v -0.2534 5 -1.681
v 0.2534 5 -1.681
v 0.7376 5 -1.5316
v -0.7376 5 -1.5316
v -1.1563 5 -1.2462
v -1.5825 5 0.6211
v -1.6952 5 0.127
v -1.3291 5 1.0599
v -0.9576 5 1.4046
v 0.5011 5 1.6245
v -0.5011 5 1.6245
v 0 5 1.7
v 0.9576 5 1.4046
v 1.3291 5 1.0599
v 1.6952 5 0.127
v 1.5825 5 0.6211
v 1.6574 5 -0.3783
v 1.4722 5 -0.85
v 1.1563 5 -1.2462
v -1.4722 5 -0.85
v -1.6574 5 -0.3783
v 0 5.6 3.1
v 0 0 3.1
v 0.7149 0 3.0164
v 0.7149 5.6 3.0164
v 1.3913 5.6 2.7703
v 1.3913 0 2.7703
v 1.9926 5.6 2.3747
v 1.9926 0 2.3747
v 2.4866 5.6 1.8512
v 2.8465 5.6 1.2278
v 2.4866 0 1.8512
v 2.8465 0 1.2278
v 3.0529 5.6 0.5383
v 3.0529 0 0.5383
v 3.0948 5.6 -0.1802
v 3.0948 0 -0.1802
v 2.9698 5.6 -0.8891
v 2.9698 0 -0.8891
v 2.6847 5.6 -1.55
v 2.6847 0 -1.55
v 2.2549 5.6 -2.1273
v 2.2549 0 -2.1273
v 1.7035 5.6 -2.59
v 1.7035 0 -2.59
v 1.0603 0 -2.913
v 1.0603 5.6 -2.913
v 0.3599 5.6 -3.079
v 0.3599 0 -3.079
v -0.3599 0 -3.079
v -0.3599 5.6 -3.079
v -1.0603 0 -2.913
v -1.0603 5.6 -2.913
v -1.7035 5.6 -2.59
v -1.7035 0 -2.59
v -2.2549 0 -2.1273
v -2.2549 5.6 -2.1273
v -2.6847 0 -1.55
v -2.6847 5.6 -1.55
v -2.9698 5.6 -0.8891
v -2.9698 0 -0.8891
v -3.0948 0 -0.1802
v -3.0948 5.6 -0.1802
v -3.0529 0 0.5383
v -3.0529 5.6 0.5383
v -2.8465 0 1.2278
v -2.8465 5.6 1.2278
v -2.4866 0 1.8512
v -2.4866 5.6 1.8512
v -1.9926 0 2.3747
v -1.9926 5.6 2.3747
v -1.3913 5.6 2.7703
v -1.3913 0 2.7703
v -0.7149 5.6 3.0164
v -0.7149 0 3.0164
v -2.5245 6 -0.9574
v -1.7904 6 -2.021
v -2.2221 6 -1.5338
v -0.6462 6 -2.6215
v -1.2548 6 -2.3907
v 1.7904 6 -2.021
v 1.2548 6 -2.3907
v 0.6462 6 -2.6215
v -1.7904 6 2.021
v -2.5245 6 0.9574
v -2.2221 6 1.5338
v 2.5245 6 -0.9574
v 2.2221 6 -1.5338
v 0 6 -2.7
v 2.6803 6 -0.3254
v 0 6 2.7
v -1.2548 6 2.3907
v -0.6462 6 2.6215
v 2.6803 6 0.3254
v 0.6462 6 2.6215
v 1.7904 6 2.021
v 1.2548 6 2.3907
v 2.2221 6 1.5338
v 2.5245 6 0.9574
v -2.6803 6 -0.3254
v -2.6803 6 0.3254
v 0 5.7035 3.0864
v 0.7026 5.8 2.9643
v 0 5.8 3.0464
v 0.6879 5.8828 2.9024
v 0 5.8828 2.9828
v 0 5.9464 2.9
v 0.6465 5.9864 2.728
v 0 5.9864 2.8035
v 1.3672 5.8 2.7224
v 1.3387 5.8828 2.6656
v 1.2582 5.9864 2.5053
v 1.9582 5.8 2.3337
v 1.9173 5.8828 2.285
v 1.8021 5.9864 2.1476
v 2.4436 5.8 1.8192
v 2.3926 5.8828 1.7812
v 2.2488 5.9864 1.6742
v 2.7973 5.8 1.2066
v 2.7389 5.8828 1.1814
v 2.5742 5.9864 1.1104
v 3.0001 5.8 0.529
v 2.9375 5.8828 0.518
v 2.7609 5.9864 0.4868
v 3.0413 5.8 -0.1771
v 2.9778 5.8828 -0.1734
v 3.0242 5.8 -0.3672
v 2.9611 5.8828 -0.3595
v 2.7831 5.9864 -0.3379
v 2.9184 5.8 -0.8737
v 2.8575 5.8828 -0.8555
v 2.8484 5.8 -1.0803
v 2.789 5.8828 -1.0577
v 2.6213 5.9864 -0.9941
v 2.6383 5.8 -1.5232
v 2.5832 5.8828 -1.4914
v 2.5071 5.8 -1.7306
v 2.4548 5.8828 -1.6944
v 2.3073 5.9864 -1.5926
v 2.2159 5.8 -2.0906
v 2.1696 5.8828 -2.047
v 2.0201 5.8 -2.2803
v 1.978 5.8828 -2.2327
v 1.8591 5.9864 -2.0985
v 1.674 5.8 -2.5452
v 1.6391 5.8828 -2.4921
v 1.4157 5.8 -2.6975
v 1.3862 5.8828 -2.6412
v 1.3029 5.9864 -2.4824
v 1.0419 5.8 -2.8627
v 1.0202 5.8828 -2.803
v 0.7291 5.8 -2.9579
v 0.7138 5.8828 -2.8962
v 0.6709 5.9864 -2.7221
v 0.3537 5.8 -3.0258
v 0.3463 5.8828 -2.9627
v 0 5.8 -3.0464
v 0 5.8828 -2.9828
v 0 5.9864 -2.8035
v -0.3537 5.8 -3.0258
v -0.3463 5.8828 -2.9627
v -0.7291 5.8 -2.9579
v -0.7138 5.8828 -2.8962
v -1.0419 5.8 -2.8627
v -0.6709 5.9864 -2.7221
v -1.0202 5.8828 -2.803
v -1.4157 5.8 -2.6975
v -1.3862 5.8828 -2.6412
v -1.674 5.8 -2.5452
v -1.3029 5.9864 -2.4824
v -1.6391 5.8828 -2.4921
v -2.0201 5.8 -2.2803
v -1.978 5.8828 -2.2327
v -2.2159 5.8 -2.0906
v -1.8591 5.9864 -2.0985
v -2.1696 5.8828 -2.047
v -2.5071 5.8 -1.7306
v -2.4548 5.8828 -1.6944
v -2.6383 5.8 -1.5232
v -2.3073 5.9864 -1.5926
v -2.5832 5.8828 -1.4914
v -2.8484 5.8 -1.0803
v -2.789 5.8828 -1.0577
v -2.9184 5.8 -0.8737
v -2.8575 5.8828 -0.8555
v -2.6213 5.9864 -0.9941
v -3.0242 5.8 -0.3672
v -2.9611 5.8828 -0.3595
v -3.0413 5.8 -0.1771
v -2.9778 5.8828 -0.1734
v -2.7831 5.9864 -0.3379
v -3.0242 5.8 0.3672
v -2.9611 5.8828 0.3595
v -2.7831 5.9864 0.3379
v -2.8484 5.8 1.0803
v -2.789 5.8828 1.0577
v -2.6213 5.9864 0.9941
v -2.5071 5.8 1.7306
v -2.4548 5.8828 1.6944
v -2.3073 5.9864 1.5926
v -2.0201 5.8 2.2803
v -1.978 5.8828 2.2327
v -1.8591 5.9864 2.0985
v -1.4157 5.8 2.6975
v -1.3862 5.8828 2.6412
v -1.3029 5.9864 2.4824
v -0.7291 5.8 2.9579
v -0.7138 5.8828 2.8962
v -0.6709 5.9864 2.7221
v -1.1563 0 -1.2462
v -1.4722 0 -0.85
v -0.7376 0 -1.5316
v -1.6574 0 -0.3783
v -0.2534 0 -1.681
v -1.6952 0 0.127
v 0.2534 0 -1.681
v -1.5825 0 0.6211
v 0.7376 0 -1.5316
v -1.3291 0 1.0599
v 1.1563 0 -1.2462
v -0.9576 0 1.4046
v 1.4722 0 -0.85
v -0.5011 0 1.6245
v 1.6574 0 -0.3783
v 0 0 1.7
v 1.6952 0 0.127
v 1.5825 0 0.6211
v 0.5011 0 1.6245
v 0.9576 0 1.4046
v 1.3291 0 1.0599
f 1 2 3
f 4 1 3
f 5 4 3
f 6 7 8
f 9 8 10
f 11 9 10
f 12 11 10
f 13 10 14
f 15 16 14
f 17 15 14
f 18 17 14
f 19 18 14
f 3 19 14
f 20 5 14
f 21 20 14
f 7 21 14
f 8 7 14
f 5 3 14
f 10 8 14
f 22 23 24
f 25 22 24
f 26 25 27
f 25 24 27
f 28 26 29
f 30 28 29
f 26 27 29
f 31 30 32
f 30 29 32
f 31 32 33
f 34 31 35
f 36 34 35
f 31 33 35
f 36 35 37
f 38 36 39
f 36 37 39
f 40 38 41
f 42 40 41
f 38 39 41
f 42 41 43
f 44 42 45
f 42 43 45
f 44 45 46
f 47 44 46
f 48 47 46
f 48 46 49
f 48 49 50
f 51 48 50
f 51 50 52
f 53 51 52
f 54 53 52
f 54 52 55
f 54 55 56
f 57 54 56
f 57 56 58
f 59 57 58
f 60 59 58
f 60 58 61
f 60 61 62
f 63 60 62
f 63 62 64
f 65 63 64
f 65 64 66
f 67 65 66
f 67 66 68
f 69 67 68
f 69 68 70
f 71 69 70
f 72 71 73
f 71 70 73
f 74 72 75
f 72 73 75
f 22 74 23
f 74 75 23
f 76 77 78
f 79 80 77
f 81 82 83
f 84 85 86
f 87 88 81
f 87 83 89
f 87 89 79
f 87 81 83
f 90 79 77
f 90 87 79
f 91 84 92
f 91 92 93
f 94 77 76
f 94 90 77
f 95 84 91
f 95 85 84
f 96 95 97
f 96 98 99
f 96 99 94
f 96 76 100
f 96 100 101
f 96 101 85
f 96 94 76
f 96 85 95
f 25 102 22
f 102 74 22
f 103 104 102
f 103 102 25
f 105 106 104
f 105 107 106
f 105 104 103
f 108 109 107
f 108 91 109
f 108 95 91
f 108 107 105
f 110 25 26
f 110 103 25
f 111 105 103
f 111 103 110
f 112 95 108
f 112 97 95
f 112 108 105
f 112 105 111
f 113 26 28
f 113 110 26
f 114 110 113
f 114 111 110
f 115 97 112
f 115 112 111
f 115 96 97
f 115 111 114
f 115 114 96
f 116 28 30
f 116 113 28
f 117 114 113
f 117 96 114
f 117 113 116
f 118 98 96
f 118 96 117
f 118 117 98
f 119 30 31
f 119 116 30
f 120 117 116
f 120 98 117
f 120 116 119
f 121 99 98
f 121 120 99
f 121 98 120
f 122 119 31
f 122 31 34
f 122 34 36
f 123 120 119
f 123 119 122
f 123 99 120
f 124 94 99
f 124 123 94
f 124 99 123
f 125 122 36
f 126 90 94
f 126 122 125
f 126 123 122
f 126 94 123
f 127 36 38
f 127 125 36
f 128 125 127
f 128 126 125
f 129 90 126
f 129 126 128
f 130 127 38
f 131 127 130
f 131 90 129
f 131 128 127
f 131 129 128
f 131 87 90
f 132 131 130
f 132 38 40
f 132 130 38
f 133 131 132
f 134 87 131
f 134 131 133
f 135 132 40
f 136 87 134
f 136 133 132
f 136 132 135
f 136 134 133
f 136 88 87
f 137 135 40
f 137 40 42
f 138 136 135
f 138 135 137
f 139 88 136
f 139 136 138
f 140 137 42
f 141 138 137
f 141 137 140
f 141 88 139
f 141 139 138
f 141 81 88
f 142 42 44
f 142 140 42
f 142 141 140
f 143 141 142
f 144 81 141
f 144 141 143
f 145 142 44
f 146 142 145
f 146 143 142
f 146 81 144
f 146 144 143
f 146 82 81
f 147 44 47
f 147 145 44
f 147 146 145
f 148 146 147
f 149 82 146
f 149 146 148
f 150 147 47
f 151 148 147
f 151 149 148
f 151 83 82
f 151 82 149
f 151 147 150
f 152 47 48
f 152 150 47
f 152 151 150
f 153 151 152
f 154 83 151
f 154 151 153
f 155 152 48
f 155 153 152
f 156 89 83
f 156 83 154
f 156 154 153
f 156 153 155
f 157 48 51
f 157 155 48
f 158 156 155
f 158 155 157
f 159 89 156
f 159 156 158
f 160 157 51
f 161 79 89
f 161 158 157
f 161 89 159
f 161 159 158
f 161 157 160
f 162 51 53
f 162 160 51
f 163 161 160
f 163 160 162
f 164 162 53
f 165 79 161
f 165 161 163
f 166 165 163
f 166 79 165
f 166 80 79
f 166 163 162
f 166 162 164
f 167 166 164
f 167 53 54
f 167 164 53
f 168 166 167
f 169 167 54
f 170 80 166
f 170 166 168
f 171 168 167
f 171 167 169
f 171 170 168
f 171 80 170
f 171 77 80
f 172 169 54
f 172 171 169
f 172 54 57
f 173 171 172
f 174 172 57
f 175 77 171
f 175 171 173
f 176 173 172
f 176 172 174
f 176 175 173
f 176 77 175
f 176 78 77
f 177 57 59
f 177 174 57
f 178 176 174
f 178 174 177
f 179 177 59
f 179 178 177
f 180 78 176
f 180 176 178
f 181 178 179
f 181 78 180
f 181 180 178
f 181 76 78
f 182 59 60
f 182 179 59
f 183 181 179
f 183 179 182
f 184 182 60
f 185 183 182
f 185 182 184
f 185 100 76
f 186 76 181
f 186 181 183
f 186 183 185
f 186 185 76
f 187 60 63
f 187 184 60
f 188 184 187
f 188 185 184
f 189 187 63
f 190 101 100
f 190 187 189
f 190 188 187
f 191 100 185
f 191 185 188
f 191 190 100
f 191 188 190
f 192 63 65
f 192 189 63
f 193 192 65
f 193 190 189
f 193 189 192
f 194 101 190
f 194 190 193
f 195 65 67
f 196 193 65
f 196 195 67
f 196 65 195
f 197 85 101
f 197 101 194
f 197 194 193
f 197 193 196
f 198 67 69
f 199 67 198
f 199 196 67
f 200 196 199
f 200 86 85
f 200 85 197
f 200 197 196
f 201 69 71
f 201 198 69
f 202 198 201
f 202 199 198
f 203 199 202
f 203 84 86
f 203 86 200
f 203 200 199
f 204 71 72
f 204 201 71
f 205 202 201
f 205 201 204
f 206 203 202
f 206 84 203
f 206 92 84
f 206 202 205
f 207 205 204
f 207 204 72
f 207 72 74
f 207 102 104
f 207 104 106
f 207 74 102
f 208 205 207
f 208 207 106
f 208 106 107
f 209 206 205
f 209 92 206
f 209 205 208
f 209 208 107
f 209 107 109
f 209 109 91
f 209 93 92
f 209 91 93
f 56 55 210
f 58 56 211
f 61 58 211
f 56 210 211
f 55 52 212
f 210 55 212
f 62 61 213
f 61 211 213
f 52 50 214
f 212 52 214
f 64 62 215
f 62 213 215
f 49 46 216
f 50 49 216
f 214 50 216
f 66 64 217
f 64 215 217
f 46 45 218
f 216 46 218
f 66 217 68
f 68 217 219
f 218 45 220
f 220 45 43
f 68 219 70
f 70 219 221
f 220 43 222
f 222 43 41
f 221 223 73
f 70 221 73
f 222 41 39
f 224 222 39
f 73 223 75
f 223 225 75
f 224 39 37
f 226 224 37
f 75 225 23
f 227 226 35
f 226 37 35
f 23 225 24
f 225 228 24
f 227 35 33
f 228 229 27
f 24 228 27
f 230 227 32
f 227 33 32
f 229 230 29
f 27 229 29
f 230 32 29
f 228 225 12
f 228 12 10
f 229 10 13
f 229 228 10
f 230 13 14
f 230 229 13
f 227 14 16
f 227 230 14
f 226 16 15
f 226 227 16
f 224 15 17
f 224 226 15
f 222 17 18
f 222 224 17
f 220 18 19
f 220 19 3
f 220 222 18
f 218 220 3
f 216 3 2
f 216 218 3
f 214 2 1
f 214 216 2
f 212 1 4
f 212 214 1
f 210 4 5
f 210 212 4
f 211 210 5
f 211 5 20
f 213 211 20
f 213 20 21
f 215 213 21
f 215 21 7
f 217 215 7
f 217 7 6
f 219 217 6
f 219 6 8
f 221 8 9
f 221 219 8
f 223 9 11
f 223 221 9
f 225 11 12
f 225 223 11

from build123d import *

# Parameters (mm, degrees)
SKETCH_1_R      = 3.1
SKETCH_1_R_2    = 1.7
EXTRUDE_1_DEPTH = 5
SKETCH_2_R      = 3.1
EXTRUDE_2_DEPTH = 1
FILLET_1_R      = 0.4


with BuildPart() as part:
    # 草图1 → 凸台-拉伸1 (new body)
    with BuildSketch(Plane(origin=(0, 0, 0), x_dir=(1, 0, 0), z_dir=(0, 1, 0))):
        with Locations(Location((0, 0, 0), (0, 0, 270))):
            Circle(SKETCH_1_R)
        with Locations(Location((0, 0, 0), (0, 0, 270))):
            Circle(SKETCH_1_R_2, mode=Mode.SUBTRACT)
    extrude(amount=EXTRUDE_1_DEPTH)

    # 草图2 → 凸台-拉伸2 (add)
    with BuildSketch(Plane(origin=(0, 5, 0), x_dir=(1, 0, 0), z_dir=(0, 1, 0))):
        with Locations(Location((0, 0, 0), (0, 0, 270))):
            Circle(SKETCH_2_R)
    extrude(amount=EXTRUDE_2_DEPTH)

    # 圆角1
    fillet_1_edges = [part.edges().sort_by_distance(p)[0] for p in [
        (0, 6, -3.1),
    ]]
    fillet(fillet_1_edges, radius=FILLET_1_R)


solid = part.part
